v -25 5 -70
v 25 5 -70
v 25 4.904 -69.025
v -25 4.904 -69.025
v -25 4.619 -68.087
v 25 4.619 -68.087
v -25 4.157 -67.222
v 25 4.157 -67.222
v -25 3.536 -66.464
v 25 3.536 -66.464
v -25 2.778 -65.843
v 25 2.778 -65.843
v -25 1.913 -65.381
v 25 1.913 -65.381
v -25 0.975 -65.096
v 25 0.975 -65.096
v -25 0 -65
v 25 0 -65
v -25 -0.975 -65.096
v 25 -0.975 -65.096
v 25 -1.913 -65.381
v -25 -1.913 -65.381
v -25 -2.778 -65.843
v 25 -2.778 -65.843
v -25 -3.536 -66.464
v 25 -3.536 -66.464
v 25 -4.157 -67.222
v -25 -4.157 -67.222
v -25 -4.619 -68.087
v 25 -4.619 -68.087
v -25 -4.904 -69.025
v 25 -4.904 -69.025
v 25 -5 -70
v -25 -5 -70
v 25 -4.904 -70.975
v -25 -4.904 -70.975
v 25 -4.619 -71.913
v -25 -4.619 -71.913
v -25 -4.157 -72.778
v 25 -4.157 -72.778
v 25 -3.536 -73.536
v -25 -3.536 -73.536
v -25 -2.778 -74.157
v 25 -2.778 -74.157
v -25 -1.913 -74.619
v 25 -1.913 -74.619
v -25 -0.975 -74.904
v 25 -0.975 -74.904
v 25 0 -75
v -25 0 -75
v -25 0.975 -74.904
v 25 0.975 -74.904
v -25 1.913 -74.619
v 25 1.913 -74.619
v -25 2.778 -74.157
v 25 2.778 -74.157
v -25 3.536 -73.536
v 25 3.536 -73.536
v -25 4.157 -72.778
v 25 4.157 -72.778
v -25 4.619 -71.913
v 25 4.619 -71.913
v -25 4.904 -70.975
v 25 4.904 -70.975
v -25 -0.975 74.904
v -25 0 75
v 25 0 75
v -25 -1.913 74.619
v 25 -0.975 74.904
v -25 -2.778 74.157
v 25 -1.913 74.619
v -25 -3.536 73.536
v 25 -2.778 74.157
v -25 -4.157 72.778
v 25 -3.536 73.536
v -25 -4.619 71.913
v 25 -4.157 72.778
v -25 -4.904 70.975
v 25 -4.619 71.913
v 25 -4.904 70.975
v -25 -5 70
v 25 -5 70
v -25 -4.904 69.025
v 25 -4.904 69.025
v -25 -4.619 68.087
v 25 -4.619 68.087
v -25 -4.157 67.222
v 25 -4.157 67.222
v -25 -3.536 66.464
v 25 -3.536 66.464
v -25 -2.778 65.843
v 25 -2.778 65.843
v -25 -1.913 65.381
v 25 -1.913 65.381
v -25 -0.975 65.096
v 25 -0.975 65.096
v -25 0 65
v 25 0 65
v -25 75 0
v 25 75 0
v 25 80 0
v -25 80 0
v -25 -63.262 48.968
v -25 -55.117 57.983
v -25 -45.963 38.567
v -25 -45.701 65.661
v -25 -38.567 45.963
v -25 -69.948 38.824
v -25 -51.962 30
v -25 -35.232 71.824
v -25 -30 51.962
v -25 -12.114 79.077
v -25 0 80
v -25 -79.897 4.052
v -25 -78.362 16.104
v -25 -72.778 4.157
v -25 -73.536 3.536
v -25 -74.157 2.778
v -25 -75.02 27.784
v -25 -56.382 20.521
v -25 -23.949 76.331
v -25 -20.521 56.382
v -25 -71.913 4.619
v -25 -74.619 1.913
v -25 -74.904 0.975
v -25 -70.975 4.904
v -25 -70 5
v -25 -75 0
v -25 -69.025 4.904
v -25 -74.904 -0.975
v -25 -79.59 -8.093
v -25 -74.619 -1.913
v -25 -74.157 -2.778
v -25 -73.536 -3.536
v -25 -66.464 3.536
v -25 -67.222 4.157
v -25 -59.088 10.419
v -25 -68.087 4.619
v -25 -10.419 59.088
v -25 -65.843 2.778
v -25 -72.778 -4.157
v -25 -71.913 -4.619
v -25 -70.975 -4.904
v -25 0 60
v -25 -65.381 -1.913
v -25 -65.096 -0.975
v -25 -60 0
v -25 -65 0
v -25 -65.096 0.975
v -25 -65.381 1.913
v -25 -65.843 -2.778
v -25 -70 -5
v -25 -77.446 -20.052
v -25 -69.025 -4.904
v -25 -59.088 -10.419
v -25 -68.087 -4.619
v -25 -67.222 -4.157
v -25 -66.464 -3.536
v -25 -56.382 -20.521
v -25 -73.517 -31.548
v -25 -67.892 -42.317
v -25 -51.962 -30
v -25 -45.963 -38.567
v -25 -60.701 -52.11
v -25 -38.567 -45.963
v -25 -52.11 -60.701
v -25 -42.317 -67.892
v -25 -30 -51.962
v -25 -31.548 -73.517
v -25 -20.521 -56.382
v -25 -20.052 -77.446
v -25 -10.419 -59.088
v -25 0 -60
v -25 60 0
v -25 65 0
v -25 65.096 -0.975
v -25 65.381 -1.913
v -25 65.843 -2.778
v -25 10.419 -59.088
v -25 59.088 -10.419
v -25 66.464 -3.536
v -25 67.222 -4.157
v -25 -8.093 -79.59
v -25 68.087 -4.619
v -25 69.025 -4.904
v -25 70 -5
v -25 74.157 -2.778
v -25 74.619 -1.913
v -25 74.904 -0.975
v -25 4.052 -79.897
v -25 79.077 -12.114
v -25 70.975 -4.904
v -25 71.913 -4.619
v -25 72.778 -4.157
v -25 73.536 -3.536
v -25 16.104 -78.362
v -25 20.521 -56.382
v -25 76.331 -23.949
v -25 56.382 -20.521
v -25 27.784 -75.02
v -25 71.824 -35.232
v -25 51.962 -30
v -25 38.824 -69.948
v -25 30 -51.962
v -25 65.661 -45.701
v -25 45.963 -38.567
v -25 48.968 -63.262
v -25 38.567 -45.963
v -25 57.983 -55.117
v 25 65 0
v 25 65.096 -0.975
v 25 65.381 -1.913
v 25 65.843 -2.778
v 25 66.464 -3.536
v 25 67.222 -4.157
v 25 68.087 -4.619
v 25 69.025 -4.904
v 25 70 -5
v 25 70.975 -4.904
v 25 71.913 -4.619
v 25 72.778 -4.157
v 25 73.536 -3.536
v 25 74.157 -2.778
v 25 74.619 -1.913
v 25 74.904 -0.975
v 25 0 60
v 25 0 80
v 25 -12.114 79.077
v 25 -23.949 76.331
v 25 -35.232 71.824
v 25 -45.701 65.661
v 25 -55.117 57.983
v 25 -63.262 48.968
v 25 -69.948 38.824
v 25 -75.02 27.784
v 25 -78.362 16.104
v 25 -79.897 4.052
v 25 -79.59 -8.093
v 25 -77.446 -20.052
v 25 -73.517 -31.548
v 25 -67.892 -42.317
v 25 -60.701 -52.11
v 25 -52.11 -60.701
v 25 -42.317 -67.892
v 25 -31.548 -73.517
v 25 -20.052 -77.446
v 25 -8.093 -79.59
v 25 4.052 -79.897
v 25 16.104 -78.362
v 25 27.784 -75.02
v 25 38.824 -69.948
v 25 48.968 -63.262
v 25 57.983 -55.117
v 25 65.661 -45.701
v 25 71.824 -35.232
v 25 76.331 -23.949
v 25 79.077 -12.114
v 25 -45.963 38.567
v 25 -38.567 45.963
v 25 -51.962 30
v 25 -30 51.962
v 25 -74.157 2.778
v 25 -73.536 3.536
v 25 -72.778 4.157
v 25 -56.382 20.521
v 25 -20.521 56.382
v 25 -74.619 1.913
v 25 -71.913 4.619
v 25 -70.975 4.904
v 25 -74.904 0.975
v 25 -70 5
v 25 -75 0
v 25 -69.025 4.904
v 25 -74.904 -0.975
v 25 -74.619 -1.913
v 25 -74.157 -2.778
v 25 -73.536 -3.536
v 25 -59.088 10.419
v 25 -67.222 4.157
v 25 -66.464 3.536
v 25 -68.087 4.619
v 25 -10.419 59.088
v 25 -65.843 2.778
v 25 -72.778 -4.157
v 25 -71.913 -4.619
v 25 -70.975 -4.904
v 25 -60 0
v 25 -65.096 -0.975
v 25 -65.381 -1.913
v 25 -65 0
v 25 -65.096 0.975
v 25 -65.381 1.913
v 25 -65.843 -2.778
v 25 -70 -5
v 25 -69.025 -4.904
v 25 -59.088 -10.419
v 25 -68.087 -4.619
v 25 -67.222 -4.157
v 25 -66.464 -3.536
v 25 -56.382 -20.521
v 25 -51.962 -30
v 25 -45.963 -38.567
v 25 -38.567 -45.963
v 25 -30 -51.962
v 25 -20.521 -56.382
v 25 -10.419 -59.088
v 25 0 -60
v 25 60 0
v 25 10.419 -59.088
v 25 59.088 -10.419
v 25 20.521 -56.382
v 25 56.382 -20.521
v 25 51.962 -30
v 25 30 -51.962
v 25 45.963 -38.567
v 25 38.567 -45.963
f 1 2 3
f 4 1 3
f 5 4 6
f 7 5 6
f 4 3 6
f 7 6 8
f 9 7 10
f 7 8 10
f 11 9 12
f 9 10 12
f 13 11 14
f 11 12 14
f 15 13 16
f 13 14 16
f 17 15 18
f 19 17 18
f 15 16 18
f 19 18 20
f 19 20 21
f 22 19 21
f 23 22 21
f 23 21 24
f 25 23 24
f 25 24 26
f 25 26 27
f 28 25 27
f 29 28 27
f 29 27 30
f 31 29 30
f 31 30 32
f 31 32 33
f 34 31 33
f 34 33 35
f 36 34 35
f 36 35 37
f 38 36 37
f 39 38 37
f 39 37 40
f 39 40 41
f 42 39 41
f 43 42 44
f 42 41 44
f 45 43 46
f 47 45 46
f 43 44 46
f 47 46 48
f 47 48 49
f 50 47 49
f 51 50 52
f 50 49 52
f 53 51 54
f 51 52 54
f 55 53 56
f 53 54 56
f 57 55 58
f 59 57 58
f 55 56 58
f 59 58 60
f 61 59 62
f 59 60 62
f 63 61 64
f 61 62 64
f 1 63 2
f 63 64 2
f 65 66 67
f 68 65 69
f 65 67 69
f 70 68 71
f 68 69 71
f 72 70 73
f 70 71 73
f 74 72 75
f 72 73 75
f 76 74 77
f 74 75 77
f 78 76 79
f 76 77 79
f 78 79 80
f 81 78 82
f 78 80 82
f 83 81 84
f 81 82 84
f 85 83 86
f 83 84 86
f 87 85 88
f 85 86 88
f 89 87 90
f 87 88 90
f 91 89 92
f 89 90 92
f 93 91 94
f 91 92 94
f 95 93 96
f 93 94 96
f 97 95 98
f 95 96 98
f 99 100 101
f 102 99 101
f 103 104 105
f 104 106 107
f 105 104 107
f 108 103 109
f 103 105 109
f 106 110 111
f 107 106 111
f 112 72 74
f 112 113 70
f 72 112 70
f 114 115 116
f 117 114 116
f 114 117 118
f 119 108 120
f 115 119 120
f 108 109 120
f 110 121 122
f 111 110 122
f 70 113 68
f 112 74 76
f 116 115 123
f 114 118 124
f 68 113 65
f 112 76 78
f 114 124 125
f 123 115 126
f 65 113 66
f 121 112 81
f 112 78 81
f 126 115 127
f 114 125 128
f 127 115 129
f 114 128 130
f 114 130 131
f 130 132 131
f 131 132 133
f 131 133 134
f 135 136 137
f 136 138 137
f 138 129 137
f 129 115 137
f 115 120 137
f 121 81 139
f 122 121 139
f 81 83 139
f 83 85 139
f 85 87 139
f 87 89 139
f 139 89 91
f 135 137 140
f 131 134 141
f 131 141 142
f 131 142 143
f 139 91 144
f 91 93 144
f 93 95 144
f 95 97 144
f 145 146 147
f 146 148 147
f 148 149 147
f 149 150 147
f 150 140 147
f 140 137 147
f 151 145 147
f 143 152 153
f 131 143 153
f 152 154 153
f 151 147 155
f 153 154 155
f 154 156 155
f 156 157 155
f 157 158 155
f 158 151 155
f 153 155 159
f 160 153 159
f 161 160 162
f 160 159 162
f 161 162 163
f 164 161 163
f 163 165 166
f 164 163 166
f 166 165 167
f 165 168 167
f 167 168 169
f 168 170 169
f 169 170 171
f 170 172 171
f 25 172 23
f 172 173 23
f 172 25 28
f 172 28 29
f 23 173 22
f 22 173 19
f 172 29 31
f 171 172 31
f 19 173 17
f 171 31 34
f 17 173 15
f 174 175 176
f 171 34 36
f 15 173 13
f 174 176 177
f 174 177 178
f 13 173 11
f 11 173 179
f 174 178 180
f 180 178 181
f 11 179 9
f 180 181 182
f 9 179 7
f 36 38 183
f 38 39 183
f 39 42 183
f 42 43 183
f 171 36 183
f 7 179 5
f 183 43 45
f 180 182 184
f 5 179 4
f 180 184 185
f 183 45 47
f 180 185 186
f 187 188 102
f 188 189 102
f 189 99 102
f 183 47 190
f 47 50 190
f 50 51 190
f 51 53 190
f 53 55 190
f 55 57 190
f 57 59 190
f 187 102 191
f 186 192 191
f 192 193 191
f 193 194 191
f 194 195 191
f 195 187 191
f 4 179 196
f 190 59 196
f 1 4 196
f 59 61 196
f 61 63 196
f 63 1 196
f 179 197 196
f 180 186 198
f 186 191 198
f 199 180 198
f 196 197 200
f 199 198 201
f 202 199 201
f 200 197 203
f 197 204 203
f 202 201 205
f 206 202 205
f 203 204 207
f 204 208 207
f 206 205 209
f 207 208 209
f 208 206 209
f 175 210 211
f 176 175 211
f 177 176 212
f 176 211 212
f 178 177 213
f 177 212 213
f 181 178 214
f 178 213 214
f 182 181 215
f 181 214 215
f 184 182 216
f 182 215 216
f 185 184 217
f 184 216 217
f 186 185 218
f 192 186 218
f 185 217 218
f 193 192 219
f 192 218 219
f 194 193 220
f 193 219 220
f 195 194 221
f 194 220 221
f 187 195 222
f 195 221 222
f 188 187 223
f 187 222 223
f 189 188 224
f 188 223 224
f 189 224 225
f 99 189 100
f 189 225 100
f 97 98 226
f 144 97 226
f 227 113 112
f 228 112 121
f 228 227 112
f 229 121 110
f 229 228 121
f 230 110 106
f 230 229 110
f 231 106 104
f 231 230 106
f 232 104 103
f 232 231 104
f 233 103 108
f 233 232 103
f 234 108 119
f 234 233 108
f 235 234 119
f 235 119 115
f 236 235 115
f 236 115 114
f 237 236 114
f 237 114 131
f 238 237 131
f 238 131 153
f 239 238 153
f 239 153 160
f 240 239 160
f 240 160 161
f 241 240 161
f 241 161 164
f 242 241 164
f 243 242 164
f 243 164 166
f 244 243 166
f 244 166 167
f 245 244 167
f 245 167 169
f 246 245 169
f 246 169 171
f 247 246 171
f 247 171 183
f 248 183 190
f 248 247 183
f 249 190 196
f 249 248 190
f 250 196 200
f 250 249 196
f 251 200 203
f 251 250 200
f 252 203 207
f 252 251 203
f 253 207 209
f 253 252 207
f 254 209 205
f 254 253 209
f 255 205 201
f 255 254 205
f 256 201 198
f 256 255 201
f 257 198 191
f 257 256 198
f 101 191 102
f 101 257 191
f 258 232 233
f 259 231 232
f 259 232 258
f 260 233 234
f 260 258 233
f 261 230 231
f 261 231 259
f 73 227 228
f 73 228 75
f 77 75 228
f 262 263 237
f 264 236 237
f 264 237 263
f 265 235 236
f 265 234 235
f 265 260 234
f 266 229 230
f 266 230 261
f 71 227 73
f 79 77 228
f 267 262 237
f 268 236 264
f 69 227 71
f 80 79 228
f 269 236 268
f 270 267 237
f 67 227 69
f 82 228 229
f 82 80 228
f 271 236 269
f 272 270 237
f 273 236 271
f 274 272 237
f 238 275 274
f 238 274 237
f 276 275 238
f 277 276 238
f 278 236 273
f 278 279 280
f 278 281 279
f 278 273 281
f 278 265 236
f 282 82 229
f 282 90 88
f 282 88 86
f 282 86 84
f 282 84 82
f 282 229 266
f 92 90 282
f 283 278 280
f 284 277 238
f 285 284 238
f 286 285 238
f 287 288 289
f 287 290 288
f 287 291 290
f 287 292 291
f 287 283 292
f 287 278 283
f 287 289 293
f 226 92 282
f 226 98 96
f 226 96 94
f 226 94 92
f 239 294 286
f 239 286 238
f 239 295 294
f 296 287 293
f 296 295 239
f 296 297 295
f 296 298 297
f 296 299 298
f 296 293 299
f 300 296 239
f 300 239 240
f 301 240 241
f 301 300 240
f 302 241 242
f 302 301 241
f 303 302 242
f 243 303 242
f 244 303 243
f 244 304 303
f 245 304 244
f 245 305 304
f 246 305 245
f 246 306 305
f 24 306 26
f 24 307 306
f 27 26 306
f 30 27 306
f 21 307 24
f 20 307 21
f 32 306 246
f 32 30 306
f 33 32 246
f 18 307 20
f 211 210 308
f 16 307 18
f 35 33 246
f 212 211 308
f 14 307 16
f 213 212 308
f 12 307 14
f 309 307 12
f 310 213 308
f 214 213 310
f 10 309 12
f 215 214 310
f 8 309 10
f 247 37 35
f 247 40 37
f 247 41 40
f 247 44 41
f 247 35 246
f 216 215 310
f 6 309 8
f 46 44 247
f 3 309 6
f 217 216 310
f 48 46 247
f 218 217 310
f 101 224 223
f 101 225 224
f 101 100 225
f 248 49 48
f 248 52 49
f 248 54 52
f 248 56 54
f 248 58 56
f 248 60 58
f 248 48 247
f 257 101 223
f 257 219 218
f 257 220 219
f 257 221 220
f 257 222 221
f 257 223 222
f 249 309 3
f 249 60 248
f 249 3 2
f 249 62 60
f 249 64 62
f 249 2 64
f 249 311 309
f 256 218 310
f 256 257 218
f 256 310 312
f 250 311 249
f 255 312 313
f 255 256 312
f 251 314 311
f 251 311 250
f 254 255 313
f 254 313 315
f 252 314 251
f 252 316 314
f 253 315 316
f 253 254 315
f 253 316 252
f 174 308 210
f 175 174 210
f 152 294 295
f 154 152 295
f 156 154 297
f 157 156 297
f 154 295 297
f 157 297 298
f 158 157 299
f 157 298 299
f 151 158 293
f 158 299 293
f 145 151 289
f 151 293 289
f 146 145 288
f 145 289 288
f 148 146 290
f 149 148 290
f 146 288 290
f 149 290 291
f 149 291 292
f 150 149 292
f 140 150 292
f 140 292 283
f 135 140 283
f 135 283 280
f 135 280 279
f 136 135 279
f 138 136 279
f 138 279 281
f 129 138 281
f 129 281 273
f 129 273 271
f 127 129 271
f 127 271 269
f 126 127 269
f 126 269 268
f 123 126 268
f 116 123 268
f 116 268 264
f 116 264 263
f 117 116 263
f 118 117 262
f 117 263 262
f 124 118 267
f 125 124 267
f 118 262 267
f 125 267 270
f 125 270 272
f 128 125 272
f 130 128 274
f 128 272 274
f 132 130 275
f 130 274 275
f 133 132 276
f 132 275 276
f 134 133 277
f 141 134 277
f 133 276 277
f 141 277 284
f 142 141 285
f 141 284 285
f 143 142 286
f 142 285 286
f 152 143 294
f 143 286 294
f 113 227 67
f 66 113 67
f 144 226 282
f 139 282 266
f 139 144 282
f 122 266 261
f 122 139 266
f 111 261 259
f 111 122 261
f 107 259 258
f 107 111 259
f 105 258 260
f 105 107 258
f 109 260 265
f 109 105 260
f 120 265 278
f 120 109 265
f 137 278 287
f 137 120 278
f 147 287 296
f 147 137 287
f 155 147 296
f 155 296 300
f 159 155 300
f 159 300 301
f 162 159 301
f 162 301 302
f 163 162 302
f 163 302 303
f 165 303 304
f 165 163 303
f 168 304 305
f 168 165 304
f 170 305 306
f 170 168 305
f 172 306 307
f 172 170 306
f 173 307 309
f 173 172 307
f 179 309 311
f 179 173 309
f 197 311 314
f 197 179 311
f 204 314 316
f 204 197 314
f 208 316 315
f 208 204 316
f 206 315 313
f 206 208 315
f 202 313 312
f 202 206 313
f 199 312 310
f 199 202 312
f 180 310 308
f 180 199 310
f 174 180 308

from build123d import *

# Parameters (mm, degrees)
SKETCH1_R           = 80
SKETCH1_R_2         = 60
BOSS_EXTRUDE1_DEPTH = 25
SKETCH2_R           = 5
CUT_EXTRUDE1_DEPTH  = 124.693168769
CIRPATTERN1_COUNT   = 4
CUT_EXTRUDE2_DEPTH  = 124.693168769


with BuildPart() as part:
    # Sketch1 → Boss-Extrude1 (new, symmetric)
    with BuildSketch(Plane.YZ):
        with Locations(Location((0, 0, 0), (0, 0, 270))):
            Circle(SKETCH1_R)
        with Locations(Location((0, 0, 0), (0, 0, 270))):
            Circle(SKETCH1_R_2, mode=Mode.SUBTRACT)
    extrude(amount=BOSS_EXTRUDE1_DEPTH, both=True)

    # Sketch2 → Cut-Extrude1 (cut, through all)
    with BuildSketch(Plane.YZ.offset(25)):
        with Locations(Location((-70, 0, 0), (0, 0, 270))):
            Circle(SKETCH2_R)
    cut_extrude1 = extrude(amount=-CUT_EXTRUDE1_DEPTH, mode=Mode.SUBTRACT)

    # CirPattern1: Cut-Extrude1 ×4 about axis
    cirpattern1_axis = Axis((0, 0, 0), (1, 0, 0))
    for i in range(1, CIRPATTERN1_COUNT):
        add(cut_extrude1.rotate(cirpattern1_axis, i * 360 / CIRPATTERN1_COUNT), mode=Mode.SUBTRACT)

    # Sketch3 → Cut-Extrude2 (cut, through all)
    with BuildSketch(Plane.YZ.offset(25)):
        Polygon((0, 93.474358871), (0, 0), (100.664694168, 0), (100.664694168, 96.534076019), align=None)
    extrude(amount=-CUT_EXTRUDE2_DEPTH, mode=Mode.SUBTRACT)


solid = part.part
